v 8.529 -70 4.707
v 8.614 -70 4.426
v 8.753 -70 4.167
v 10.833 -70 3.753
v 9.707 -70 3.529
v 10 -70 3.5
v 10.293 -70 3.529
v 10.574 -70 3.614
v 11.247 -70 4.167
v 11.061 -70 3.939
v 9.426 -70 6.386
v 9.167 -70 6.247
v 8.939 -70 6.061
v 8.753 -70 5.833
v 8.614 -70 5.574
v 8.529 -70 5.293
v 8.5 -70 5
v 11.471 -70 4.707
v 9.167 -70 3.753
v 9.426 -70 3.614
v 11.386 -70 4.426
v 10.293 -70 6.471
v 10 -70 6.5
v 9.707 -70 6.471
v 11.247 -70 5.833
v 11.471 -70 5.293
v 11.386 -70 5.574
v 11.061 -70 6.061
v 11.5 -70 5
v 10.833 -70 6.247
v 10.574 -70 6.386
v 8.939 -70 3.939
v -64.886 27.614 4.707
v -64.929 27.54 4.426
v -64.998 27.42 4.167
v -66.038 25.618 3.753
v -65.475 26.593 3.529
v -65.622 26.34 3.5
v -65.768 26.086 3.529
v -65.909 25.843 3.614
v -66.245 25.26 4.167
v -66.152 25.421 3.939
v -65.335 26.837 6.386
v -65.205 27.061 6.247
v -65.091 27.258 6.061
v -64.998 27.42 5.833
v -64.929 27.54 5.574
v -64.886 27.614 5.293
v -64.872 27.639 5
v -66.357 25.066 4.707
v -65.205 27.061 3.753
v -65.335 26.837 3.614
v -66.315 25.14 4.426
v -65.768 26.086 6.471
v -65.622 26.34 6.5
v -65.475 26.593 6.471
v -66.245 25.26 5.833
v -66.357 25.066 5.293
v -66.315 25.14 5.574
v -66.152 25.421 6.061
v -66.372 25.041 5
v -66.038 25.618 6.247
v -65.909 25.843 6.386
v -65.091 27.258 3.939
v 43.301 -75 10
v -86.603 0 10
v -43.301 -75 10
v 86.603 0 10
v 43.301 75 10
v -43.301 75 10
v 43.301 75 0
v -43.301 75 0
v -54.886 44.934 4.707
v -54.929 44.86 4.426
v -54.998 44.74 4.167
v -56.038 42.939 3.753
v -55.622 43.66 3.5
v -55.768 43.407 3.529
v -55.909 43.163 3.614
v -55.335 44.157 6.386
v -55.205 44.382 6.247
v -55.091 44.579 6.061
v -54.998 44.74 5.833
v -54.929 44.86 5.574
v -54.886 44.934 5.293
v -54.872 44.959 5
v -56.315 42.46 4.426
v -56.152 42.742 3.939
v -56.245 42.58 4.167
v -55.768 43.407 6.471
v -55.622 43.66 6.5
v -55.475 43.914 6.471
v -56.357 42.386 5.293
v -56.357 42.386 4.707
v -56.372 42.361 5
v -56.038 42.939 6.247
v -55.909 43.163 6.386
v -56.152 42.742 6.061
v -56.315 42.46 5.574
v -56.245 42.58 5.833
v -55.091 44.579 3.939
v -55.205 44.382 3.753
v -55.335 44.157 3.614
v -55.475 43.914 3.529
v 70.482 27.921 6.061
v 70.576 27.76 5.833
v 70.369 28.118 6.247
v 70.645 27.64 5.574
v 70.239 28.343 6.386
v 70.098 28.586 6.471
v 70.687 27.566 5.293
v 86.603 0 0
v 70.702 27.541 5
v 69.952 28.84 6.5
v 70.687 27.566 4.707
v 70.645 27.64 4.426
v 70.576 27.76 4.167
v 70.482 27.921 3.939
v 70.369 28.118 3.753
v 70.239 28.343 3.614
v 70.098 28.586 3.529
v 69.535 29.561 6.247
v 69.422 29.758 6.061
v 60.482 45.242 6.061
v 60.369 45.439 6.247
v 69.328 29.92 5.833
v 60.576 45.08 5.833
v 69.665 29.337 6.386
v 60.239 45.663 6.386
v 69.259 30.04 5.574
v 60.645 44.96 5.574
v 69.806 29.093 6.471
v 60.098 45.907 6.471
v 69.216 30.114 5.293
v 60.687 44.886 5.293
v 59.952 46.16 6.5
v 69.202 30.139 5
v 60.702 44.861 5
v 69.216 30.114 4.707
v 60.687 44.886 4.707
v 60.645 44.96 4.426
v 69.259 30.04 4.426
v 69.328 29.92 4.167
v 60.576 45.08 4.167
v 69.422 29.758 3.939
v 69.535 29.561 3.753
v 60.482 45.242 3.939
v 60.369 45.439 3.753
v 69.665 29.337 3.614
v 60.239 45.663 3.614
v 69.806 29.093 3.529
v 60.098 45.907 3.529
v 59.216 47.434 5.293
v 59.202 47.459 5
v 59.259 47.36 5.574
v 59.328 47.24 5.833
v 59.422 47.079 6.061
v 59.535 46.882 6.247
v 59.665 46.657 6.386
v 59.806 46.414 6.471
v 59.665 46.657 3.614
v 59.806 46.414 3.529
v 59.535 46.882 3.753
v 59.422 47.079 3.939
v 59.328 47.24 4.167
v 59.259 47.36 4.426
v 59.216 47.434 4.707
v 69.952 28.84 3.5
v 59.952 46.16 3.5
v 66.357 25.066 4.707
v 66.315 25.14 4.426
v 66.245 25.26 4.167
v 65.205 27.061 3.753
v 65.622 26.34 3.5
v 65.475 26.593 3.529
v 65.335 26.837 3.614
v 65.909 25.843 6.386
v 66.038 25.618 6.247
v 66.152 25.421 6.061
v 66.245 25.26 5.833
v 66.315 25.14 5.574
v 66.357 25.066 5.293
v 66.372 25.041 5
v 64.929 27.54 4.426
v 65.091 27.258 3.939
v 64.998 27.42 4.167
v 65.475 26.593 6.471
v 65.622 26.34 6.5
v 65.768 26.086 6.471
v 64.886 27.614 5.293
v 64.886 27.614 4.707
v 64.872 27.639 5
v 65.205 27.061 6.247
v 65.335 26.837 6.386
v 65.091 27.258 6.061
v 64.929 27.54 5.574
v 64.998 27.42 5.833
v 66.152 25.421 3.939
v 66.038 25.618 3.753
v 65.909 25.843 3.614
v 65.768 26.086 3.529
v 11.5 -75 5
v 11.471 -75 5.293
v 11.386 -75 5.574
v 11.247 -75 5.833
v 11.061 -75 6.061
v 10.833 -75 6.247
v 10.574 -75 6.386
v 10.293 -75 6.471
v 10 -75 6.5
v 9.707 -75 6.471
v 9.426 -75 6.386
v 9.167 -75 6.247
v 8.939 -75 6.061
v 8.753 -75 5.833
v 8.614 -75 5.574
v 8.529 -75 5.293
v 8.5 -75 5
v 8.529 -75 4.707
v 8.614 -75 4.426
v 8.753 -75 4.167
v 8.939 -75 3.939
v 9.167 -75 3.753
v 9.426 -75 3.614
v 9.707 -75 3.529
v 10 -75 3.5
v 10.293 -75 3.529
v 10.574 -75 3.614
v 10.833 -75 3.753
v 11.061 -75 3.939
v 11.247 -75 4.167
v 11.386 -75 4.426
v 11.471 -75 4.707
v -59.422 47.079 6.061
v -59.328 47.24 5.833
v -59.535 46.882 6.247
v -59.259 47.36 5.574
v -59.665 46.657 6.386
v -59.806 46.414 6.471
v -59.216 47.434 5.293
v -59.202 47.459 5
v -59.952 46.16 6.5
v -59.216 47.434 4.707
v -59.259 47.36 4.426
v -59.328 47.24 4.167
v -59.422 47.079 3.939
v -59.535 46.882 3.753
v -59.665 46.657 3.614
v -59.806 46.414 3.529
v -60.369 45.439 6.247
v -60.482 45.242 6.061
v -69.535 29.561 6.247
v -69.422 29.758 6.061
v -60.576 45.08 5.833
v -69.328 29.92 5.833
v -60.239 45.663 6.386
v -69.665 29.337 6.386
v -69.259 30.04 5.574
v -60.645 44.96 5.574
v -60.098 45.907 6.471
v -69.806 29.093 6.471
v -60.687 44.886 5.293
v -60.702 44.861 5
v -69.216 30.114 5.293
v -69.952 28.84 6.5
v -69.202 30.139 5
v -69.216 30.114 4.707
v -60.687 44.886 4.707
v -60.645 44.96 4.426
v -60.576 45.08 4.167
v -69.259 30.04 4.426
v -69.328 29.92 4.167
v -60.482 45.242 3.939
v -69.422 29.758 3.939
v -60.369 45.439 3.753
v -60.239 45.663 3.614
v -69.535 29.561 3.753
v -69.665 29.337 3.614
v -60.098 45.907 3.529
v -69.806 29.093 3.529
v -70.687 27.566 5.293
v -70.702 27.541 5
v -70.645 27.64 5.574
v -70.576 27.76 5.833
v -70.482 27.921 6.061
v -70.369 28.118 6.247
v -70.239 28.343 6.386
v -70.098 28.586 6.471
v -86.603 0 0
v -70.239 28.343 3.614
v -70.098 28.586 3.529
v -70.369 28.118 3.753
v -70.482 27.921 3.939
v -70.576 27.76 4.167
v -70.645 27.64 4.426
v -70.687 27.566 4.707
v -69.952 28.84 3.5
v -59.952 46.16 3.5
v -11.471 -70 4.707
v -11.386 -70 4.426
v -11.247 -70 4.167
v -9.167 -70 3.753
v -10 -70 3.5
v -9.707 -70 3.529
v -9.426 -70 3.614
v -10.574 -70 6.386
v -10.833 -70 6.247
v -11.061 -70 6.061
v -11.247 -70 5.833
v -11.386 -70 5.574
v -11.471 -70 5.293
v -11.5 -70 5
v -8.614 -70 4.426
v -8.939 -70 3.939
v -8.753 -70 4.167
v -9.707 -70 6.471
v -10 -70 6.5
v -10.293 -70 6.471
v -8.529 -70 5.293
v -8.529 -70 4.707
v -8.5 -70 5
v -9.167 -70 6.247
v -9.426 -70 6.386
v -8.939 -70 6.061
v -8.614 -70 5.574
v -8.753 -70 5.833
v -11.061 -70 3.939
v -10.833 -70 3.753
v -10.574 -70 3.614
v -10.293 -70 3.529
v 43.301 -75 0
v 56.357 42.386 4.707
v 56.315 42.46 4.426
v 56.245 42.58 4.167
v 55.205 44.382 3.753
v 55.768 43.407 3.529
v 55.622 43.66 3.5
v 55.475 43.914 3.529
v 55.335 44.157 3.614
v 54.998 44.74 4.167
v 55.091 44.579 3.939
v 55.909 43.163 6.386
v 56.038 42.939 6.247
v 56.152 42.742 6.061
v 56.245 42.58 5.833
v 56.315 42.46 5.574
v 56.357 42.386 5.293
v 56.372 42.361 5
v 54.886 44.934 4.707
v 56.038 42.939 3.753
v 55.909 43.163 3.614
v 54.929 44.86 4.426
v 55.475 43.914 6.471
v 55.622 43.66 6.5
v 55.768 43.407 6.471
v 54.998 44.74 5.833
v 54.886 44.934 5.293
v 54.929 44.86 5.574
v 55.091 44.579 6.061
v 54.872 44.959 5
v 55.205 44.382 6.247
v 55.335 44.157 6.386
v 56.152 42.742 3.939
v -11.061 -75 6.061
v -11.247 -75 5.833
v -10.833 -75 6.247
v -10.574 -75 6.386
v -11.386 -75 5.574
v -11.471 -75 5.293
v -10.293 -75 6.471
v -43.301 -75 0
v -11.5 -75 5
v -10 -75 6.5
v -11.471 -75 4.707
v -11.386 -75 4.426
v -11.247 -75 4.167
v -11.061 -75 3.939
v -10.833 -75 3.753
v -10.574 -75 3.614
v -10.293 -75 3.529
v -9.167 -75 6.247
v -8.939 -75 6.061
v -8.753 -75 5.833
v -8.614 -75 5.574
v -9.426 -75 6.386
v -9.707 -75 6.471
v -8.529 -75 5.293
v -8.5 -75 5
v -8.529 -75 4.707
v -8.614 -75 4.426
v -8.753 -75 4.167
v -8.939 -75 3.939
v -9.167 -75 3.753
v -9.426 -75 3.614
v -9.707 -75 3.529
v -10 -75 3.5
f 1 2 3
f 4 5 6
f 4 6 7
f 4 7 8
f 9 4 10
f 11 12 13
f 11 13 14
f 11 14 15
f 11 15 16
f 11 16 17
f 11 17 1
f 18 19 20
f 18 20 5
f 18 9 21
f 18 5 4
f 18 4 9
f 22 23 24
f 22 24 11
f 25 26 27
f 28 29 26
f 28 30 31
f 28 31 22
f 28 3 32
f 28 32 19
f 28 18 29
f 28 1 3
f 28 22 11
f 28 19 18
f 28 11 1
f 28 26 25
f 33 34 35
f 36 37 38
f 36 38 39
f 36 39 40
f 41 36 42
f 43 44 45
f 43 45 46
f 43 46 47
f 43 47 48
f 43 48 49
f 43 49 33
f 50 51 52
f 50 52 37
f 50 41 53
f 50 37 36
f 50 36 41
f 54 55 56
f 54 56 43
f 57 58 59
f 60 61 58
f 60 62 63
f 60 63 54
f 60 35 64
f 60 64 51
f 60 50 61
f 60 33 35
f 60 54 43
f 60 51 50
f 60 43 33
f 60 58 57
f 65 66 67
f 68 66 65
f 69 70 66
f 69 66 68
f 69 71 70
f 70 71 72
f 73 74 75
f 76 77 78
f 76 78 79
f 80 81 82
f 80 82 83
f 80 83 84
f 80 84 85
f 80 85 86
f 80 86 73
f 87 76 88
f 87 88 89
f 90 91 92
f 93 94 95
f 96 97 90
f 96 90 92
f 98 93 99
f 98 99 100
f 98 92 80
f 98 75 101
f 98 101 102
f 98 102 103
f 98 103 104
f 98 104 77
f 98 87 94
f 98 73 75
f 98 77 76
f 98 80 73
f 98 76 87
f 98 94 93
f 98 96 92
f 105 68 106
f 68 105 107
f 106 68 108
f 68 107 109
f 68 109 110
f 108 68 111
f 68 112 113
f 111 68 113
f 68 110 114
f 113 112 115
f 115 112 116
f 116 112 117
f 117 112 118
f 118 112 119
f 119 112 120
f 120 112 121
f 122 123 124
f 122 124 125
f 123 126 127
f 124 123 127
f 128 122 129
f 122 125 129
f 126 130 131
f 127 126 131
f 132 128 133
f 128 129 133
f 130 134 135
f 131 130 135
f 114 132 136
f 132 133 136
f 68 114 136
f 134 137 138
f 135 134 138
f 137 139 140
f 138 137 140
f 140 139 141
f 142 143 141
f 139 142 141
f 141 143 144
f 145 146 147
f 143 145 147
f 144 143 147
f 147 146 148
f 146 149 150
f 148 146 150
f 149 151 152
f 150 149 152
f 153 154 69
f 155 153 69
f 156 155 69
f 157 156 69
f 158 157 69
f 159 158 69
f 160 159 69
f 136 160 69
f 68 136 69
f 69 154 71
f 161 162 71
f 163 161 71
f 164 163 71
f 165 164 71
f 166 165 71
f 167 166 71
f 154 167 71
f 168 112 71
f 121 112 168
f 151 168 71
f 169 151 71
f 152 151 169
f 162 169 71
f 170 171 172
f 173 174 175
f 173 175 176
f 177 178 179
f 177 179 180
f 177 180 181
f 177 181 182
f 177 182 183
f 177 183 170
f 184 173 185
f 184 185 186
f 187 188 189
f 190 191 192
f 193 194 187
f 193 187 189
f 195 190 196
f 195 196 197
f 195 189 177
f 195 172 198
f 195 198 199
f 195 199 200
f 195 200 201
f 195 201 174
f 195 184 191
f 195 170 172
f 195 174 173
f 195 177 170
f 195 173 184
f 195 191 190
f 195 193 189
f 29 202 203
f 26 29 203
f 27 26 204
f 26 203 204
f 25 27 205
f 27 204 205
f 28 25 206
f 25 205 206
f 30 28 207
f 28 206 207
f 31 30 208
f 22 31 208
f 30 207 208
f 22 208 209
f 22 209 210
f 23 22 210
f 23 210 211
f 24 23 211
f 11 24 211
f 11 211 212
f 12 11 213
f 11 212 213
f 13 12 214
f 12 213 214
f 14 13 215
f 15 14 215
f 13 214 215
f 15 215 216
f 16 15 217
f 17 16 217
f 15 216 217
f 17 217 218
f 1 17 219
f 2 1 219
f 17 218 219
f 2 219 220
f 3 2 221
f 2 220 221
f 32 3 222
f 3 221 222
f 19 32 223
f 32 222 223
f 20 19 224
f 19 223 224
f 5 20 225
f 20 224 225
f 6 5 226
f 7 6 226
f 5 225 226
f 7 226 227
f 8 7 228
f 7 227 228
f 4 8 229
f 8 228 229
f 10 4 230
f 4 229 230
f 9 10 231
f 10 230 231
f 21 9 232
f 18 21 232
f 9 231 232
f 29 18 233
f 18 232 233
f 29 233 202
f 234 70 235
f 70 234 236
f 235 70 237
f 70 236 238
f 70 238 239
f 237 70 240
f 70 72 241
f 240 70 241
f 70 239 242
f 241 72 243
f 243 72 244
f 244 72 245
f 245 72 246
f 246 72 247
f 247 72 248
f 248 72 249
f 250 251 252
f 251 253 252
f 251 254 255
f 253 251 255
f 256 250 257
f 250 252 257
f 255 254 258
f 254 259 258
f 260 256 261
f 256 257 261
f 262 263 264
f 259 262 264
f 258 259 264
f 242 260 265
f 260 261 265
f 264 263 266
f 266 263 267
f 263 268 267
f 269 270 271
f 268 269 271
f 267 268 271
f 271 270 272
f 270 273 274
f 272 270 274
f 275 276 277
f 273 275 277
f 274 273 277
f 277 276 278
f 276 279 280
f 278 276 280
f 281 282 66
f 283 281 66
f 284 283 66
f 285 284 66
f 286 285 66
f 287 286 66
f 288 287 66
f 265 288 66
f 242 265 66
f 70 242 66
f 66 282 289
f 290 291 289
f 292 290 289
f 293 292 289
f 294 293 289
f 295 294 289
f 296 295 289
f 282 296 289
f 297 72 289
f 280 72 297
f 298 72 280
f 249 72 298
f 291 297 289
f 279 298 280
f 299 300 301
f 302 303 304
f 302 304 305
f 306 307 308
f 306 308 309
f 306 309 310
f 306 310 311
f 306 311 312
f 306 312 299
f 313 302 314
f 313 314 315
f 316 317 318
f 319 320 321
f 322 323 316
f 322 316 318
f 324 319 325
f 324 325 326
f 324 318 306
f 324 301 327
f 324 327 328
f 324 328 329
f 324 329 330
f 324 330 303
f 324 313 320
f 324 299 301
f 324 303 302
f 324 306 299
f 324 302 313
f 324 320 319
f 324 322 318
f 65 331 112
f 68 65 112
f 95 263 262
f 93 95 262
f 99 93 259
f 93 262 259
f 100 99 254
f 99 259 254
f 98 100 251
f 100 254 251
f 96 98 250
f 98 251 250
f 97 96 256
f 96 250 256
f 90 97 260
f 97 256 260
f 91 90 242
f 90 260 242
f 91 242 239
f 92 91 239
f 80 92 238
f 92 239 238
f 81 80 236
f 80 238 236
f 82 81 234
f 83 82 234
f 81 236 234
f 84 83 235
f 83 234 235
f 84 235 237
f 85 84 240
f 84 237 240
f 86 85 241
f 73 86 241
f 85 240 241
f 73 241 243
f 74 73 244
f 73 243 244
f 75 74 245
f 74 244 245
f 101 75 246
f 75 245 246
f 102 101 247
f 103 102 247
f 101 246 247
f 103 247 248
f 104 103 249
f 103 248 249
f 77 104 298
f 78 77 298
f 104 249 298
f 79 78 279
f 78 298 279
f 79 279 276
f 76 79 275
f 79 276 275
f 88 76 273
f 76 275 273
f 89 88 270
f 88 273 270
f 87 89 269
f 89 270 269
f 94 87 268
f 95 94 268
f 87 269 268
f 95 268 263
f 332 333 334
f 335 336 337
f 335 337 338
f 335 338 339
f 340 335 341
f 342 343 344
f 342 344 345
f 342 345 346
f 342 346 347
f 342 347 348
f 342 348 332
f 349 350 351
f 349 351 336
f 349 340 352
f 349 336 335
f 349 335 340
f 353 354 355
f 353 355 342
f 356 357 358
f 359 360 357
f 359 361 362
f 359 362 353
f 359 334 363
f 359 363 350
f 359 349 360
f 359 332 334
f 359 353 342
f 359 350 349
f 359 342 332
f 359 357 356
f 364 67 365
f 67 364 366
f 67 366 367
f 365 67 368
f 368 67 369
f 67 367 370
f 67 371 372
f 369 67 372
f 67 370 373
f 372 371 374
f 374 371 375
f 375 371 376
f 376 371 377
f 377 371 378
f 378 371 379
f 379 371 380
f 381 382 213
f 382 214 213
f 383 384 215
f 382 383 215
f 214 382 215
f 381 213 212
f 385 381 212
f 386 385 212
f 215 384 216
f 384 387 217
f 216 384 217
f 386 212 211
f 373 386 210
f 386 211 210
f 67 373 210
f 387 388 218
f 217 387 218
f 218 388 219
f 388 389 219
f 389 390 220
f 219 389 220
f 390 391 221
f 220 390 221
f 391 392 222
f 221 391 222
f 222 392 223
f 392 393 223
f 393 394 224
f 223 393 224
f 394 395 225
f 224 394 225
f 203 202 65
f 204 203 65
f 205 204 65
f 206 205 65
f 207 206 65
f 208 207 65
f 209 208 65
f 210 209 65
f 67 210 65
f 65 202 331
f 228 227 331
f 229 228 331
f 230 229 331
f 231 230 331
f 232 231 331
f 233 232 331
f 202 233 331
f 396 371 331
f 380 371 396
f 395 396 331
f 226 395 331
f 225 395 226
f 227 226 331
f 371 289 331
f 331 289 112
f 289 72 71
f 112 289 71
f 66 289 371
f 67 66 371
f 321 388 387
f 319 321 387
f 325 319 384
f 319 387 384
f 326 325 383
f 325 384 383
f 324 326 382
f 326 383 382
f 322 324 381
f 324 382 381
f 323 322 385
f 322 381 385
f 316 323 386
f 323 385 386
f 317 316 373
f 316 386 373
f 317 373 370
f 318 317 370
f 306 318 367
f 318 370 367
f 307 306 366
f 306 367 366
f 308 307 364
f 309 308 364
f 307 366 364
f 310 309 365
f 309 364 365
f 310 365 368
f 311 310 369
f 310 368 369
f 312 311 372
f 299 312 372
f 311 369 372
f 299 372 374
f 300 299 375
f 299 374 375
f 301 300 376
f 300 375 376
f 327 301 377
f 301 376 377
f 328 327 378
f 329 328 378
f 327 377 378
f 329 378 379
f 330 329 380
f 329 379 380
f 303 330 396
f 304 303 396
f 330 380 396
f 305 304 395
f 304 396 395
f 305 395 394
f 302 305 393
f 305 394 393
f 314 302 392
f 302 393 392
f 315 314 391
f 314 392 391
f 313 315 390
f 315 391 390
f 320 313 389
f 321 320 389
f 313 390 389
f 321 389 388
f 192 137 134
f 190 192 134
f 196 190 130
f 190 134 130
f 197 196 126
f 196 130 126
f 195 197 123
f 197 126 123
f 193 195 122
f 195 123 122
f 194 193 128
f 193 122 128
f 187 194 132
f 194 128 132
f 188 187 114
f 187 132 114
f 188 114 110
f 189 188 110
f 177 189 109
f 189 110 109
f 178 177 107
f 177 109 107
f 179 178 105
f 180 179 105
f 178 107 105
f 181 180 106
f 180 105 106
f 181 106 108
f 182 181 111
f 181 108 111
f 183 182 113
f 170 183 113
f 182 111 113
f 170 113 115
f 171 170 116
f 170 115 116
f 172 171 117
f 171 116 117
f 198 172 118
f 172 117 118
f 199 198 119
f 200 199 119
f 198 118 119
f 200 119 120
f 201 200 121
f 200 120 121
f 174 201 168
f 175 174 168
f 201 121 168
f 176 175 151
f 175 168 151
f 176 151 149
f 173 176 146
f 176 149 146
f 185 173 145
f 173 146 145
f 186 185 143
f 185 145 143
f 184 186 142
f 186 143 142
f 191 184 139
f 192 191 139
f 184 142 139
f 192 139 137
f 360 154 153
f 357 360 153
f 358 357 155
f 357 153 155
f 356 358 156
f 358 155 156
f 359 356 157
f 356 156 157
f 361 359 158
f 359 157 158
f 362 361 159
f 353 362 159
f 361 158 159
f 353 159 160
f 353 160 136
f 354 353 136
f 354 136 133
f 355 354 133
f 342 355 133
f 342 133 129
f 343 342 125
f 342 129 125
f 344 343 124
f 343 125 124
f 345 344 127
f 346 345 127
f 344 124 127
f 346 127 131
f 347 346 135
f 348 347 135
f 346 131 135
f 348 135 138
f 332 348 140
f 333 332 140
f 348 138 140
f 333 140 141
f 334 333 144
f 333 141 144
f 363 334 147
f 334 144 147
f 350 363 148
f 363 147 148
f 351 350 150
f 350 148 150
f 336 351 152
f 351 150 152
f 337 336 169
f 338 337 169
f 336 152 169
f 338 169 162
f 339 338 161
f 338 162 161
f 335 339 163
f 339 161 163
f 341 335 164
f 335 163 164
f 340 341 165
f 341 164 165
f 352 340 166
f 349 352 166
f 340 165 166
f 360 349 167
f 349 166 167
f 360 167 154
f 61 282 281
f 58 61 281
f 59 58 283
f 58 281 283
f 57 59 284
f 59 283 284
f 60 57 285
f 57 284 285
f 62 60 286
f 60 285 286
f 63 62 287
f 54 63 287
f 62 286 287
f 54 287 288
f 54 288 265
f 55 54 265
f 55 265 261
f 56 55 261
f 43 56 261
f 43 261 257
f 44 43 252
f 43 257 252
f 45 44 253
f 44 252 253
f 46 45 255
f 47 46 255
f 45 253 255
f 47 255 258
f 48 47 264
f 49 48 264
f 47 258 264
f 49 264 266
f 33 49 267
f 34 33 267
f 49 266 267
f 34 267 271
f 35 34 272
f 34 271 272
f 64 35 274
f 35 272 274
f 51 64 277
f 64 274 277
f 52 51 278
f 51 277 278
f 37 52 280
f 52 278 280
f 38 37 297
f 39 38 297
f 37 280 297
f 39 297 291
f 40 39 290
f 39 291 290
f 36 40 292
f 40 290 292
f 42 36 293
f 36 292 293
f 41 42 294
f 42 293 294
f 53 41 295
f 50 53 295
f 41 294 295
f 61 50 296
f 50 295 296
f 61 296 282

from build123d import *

# Parameters (mm, degrees)
BOSS_EXTRUDE1_DEPTH = 10
SKETCH2_R           = 1.5
CUT_EXTRUDE1_DEPTH  = 5
CIRPATTERN1_COUNT   = 3


with BuildPart() as part:
    # Sketch1 → Boss-Extrude1 (new body)
    with BuildSketch(Plane.XY):
        Polygon((86.602540378, 0), (43.301270189, 75), (-43.301270189, 75), (-86.602540378, 0), (-43.301270189, -75), (43.301270189, -75), align=None)
    extrude(amount=BOSS_EXTRUDE1_DEPTH)

    # Sketch2 → Cut-Extrude1 (cut)
    with BuildSketch(Plane.XZ.offset(75)):
        with Locations((-10, 5)):
            Circle(SKETCH2_R)
        with Locations((10, 5)):
            Circle(SKETCH2_R)
    cut_extrude1 = extrude(amount=-CUT_EXTRUDE1_DEPTH, mode=Mode.SUBTRACT)

    # CirPattern1: Cut-Extrude1 ×3 about axis
    cirpattern1_axis = Axis((0, 0, 0), (0, 0, 1))
    for i in range(1, CIRPATTERN1_COUNT):
        add(cut_extrude1.rotate(cirpattern1_axis, i * 360 / CIRPATTERN1_COUNT), mode=Mode.SUBTRACT)


solid = part.part
